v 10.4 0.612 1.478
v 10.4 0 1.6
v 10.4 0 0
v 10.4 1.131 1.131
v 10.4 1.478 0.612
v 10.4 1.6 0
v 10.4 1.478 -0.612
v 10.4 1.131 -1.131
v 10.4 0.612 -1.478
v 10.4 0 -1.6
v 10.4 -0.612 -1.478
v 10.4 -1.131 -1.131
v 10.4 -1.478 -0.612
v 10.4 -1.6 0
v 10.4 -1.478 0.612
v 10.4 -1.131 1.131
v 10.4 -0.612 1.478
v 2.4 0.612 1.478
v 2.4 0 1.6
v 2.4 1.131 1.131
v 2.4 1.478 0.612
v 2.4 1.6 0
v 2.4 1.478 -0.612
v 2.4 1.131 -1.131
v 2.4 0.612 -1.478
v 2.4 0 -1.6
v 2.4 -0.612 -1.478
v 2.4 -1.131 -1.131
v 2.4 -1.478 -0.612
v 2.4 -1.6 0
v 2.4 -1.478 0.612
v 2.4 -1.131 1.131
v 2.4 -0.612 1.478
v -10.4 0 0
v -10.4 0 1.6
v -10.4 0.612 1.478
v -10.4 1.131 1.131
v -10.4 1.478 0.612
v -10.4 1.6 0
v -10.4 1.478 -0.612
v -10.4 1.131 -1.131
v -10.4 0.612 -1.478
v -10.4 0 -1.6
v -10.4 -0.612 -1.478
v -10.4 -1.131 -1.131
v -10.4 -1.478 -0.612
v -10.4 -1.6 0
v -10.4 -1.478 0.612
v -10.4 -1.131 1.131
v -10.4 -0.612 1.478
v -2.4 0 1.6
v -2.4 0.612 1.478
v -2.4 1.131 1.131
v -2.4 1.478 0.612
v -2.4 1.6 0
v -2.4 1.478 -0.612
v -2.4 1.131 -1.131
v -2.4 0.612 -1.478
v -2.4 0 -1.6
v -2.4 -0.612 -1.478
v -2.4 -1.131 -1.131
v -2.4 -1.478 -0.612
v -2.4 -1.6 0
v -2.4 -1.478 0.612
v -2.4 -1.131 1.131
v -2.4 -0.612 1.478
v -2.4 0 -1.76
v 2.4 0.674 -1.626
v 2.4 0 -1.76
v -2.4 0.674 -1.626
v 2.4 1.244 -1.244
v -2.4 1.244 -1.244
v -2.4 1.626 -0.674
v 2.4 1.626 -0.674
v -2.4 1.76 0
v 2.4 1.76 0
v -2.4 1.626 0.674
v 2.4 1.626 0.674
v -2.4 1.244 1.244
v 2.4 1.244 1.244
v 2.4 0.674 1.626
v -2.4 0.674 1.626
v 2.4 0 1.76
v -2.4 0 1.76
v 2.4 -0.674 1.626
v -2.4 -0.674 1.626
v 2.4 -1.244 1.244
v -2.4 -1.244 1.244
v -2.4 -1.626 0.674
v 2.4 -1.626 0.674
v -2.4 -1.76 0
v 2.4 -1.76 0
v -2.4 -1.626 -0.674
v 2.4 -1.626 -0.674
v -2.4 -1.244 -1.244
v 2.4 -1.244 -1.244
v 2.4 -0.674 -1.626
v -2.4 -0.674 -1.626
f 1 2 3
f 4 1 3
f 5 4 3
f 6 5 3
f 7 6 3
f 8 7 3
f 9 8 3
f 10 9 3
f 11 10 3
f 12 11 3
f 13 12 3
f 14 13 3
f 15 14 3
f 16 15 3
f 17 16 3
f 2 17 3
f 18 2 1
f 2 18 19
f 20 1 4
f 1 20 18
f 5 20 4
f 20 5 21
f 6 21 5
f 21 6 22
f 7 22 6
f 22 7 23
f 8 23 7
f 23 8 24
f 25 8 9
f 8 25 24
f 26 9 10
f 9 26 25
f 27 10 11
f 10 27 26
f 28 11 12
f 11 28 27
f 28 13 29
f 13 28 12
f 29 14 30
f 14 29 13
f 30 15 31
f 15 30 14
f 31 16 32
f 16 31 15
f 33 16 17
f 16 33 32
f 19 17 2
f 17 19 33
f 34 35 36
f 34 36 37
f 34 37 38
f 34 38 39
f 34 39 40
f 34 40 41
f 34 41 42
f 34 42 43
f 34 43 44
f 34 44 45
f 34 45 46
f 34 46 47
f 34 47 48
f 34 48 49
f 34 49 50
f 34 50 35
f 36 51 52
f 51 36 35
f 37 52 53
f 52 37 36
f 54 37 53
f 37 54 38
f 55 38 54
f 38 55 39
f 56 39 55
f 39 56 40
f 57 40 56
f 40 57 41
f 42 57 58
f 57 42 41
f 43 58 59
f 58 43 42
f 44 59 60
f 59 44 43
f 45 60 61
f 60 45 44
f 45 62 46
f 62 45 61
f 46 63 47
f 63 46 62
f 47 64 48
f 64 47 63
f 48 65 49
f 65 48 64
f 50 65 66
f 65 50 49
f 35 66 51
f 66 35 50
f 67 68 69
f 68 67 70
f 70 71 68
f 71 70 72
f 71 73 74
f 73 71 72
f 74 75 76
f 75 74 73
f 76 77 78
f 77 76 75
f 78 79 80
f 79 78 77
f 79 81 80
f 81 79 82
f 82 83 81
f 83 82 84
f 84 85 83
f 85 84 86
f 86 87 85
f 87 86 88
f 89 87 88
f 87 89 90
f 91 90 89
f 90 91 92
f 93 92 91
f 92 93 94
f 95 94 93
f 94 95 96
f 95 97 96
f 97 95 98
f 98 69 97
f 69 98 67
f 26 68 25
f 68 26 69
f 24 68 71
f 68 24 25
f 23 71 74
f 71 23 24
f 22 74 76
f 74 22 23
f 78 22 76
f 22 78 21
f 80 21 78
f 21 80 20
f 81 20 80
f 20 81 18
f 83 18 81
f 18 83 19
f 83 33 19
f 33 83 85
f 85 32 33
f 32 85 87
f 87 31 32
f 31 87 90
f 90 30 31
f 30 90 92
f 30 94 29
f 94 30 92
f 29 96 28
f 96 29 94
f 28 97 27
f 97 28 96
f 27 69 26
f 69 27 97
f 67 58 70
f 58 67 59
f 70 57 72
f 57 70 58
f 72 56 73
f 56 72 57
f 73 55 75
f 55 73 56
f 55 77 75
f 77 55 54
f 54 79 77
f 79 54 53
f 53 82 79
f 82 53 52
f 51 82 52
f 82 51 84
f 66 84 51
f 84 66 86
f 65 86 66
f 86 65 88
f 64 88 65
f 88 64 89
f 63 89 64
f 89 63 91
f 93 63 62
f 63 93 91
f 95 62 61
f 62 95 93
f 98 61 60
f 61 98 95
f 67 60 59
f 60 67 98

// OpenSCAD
// file: ../p/4-4edge.scad
use <../lib.scad>
function ldraw_lib__4_4edge() = [
// 0 Circle 1.0
// 0 Name: 4-4edge.dat
// 0 Author: James Jessiman
// 0 !LDRAW_ORG Primitive UPDATE 2017-01
// 0 !LICENSE Licensed under CC BY 2.0 and CC BY 4.0 : see CAreadme.txt
// 
// 0 BFC CERTIFY CCW
  [0,"BFC","CERTIFY"],
  [0,"BFC","CCW"],
// 
// 0 !HISTORY 1998-12-15 [PTadmin] Official Update 1998-10
// 0 !HISTORY 2005-12-28 [PTadmin] Official Update 2005-01
// 0 !HISTORY 2007-06-24 [PTadmin] Header formatted for Contributor Agreement
// 0 !HISTORY 2008-07-01 [PTadmin] Official Update 2008-01
// 0 !HISTORY 2017-01-15 [Steffen] BFCed
// 0 !HISTORY 2017-12-30 [PTadmin] Official Update 2017-01
// 
// 
// 2 24 1 0 0 0.9239 0 0.3827
  [2,24,1,0,0,0.9239,0,0.3827],
// 2 24 0.9239 0 0.3827 0.7071 0 0.7071
  [2,24,0.9239,0,0.3827,0.7071,0,0.7071],
// 2 24 0.7071 0 0.7071 0.3827 0 0.9239
  [2,24,0.7071,0,0.7071,0.3827,0,0.9239],
// 2 24 0.3827 0 0.9239 0 0 1
  [2,24,0.3827,0,0.9239,0,0,1],
// 2 24 0 0 1 -0.3827 0 0.9239
  [2,24,0,0,1,-0.3827,0,0.9239],
// 2 24 -0.3827 0 0.9239 -0.7071 0 0.7071
  [2,24,-0.3827,0,0.9239,-0.7071,0,0.7071],
// 2 24 -0.7071 0 0.7071 -0.9239 0 0.3827
  [2,24,-0.7071,0,0.7071,-0.9239,0,0.3827],
// 2 24 -0.9239 0 0.3827 -1 0 -0
  [2,24,-0.9239,0,0.3827,-1,0,-0],
// 2 24 -1 0 -0 -0.9239 0 -0.3827
  [2,24,-1,0,-0,-0.9239,0,-0.3827],
// 2 24 -0.9239 0 -0.3827 -0.7071 0 -0.7071
  [2,24,-0.9239,0,-0.3827,-0.7071,0,-0.7071],
// 2 24 -0.7071 0 -0.7071 -0.3827 0 -0.9239
  [2,24,-0.7071,0,-0.7071,-0.3827,0,-0.9239],
// 2 24 -0.3827 0 -0.9239 0 0 -1
  [2,24,-0.3827,0,-0.9239,0,0,-1],
// 2 24 0 0 -1 0.3827 0 -0.9239
  [2,24,0,0,-1,0.3827,0,-0.9239],
// 2 24 0.3827 0 -0.9239 0.7071 0 -0.7071
  [2,24,0.3827,0,-0.9239,0.7071,0,-0.7071],
// 2 24 0.7071 0 -0.7071 0.9239 0 -0.3827
  [2,24,0.7071,0,-0.7071,0.9239,0,-0.3827],
// 2 24 0.9239 0 -0.3827 1 0 0
  [2,24,0.9239,0,-0.3827,1,0,0],
];
makepoly(ldraw_lib__4_4edge(), line=0.2);
// file: ../p/4-4disc.scad
use <../lib.scad>
function ldraw_lib__4_4disc() = [
// 0 Disc 1.0
// 0 Name: 4-4disc.dat
// 0 Author: James Jessiman
// 0 !LDRAW_ORG Primitive UPDATE 2002-02
// 0 !LICENSE Licensed under CC BY 2.0 and CC BY 4.0 : see CAreadme.txt
// 
// 0 BFC CERTIFY CCW
  [0,"BFC","CERTIFY"],
  [0,"BFC","CCW"],
// 
// 0 !HISTORY 1998-12-15 [PTadmin] Official Update 1998-10
// 0 !HISTORY 2002-03-23 [sbliss] Added BFC statement
// 0 !HISTORY 2002-04-25 [PTadmin] Official Update 2002-02
// 0 !HISTORY 2007-06-24 [PTadmin] Header formatted for Contributor Agreement
// 0 !HISTORY 2008-07-01 [PTadmin] Official Update 2008-01
// 
// 
// 3 16 0 0 0 1 0 0 0.9239 0 0.3827
  [3,16,0,0,0,1,0,0,0.9239,0,0.3827],
// 3 16 0 0 0 0.9239 0 0.3827 0.7071 0 0.7071
  [3,16,0,0,0,0.9239,0,0.3827,0.7071,0,0.7071],
// 3 16 0 0 0 0.7071 0 0.7071 0.3827 0 0.9239
  [3,16,0,0,0,0.7071,0,0.7071,0.3827,0,0.9239],
// 3 16 0 0 0 0.3827 0 0.9239 0 0 1
  [3,16,0,0,0,0.3827,0,0.9239,0,0,1],
// 3 16 0 0 0 0 0 1 -0.3827 0 0.9239
  [3,16,0,0,0,0,0,1,-0.3827,0,0.9239],
// 3 16 0 0 0 -0.3827 0 0.9239 -0.7071 0 0.7071
  [3,16,0,0,0,-0.3827,0,0.9239,-0.7071,0,0.7071],
// 3 16 0 0 0 -0.7071 0 0.7071 -0.9239 0 0.3827
  [3,16,0,0,0,-0.7071,0,0.7071,-0.9239,0,0.3827],
// 3 16 0 0 0 -0.9239 0 0.3827 -1 0 -0
  [3,16,0,0,0,-0.9239,0,0.3827,-1,0,-0],
// 3 16 0 0 0 -1 0 -0 -0.9239 0 -0.3827
  [3,16,0,0,0,-1,0,-0,-0.9239,0,-0.3827],
// 3 16 0 0 0 -0.9239 0 -0.3827 -0.7071 0 -0.7071
  [3,16,0,0,0,-0.9239,0,-0.3827,-0.7071,0,-0.7071],
// 3 16 0 0 0 -0.7071 0 -0.7071 -0.3827 0 -0.9239
  [3,16,0,0,0,-0.7071,0,-0.7071,-0.3827,0,-0.9239],
// 3 16 0 0 0 -0.3827 0 -0.9239 0 0 -1
  [3,16,0,0,0,-0.3827,0,-0.9239,0,0,-1],
// 3 16 0 0 0 0 0 -1 0.3827 0 -0.9239
  [3,16,0,0,0,0,0,-1,0.3827,0,-0.9239],
// 3 16 0 0 0 0.3827 0 -0.9239 0.7071 0 -0.7071
  [3,16,0,0,0,0.3827,0,-0.9239,0.7071,0,-0.7071],
// 3 16 0 0 0 0.7071 0 -0.7071 0.9239 0 -0.3827
  [3,16,0,0,0,0.7071,0,-0.7071,0.9239,0,-0.3827],
// 3 16 0 0 0 0.9239 0 -0.3827 1 0 0
  [3,16,0,0,0,0.9239,0,-0.3827,1,0,0],
// 0
];
makepoly(ldraw_lib__4_4disc(), line=0.2);
// file: ../p/4-4cyli.scad
use <../lib.scad>
function ldraw_lib__4_4cyli() = [
// 0 Cylinder 1.0
// 0 Name: 4-4cyli.dat
// 0 Author: James Jessiman
// 0 !LDRAW_ORG Primitive UPDATE 2005-01
// 0 !LICENSE Licensed under CC BY 2.0 and CC BY 4.0 : see CAreadme.txt
// 
// 0 BFC CERTIFY CCW
  [0,"BFC","CERTIFY"],
  [0,"BFC","CCW"],
// 
// 0 !HISTORY 1998-12-15 [PTadmin] Official Update 1998-10
// 0 !HISTORY 2002-03-23 [sbliss] Added BFC statement; merged headers from files in distributions LDraw 0.27 and Complete.
// 0 !HISTORY 2002-04-25 [PTadmin] Official Update 2002-02
// 0 !HISTORY 2004-12-14 [guyvivan] BFC CCW
// 0 !HISTORY 2005-12-28 [PTadmin] Official Update 2005-01
// 0 !HISTORY 2007-06-24 [PTadmin] Header formatted for Contributor Agreement
// 0 !HISTORY 2008-07-01 [PTadmin] Official Update 2008-01
// 
// 
// 4 16 1 1 0 0.9239 1 0.3827 0.9239 0 0.3827 1 0 0
  [4,16,1,1,0,0.9239,1,0.3827,0.9239,0,0.3827,1,0,0],
// 5 24 1 0 0 1 1 0 0.9239 0 0.3827 0.9239 0 -0.3827
  [5,24,1,0,0,1,1,0,0.9239,0,0.3827,0.9239,0,-0.3827],
// 4 16 0.9239 1 0.3827 0.7071 1 0.7071 0.7071 0 0.7071 0.9239 0 0.3827
  [4,16,0.9239,1,0.3827,0.7071,1,0.7071,0.7071,0,0.7071,0.9239,0,0.3827],
// 5 24 0.9239 0 0.3827 0.9239 1 0.3827 0.7071 0 0.7071 1 0 0
  [5,24,0.9239,0,0.3827,0.9239,1,0.3827,0.7071,0,0.7071,1,0,0],
// 4 16 0.7071 1 0.7071 0.3827 1 0.9239 0.3827 0 0.9239 0.7071 0 0.7071
  [4,16,0.7071,1,0.7071,0.3827,1,0.9239,0.3827,0,0.9239,0.7071,0,0.7071],
// 5 24 0.7071 0 0.7071 0.7071 1 0.7071 0.3827 0 0.9239 0.9239 0 0.3827
  [5,24,0.7071,0,0.7071,0.7071,1,0.7071,0.3827,0,0.9239,0.9239,0,0.3827],
// 4 16 0.3827 1 0.9239 0 1 1 0 0 1 0.3827 0 0.9239
  [4,16,0.3827,1,0.9239,0,1,1,0,0,1,0.3827,0,0.9239],
// 5 24 0.3827 0 0.9239 0.3827 1 0.9239 0 0 1 0.7071 0 0.7071
  [5,24,0.3827,0,0.9239,0.3827,1,0.9239,0,0,1,0.7071,0,0.7071],
// 4 16 0 1 1 -0.3827 1 0.9239 -0.3827 0 0.9239 0 0 1
  [4,16,0,1,1,-0.3827,1,0.9239,-0.3827,0,0.9239,0,0,1],
// 5 24 0 0 1 0 1 1 -0.3827 0 0.9239 0.3827 0 0.9239
  [5,24,0,0,1,0,1,1,-0.3827,0,0.9239,0.3827,0,0.9239],
// 4 16 -0.3827 1 0.9239 -0.7071 1 0.7071 -0.7071 0 0.7071 -0.3827 0 0.9239
  [4,16,-0.3827,1,0.9239,-0.7071,1,0.7071,-0.7071,0,0.7071,-0.3827,0,0.9239],
// 5 24 -0.3827 0 0.9239 -0.3827 1 0.9239 -0.7071 0 0.7071 0 0 1
  [5,24,-0.3827,0,0.9239,-0.3827,1,0.9239,-0.7071,0,0.7071,0,0,1],
// 4 16 -0.7071 1 0.7071 -0.9239 1 0.3827 -0.9239 0 0.3827 -0.7071 0 0.7071
  [4,16,-0.7071,1,0.7071,-0.9239,1,0.3827,-0.9239,0,0.3827,-0.7071,0,0.7071],
// 5 24 -0.7071 0 0.7071 -0.7071 1 0.7071 -0.9239 0 0.3827 -0.3827 0 0.9239
  [5,24,-0.7071,0,0.7071,-0.7071,1,0.7071,-0.9239,0,0.3827,-0.3827,0,0.9239],
// 4 16 -0.9239 1 0.3827 -1 1 0 -1 0 0 -0.9239 0 0.3827
  [4,16,-0.9239,1,0.3827,-1,1,0,-1,0,0,-0.9239,0,0.3827],
// 5 24 -0.9239 0 0.3827 -0.9239 1 0.3827 -1 0 0 -0.7071 0 0.7071
  [5,24,-0.9239,0,0.3827,-0.9239,1,0.3827,-1,0,0,-0.7071,0,0.7071],
// 4 16 -1 1 0 -0.9239 1 -0.3827 -0.9239 0 -0.3827 -1 0 0
  [4,16,-1,1,0,-0.9239,1,-0.3827,-0.9239,0,-0.3827,-1,0,0],
// 5 24 -1 0 0 -1 1 0 -0.9239 0 -0.3827 -0.9239 0 0.3827
  [5,24,-1,0,0,-1,1,0,-0.9239,0,-0.3827,-0.9239,0,0.3827],
// 4 16 -0.9239 1 -0.3827 -0.7071 1 -0.7071 -0.7071 0 -0.7071 -0.9239 0 -0.3827
  [4,16,-0.9239,1,-0.3827,-0.7071,1,-0.7071,-0.7071,0,-0.7071,-0.9239,0,-0.3827],
// 5 24 -0.9239 0 -0.3827 -0.9239 1 -0.3827 -0.7071 0 -0.7071 -1 0 0
  [5,24,-0.9239,0,-0.3827,-0.9239,1,-0.3827,-0.7071,0,-0.7071,-1,0,0],
// 4 16 -0.7071 1 -0.7071 -0.3827 1 -0.9239 -0.3827 0 -0.9239 -0.7071 0 -0.7071
  [4,16,-0.7071,1,-0.7071,-0.3827,1,-0.9239,-0.3827,0,-0.9239,-0.7071,0,-0.7071],
// 5 24 -0.7071 0 -0.7071 -0.7071 1 -0.7071 -0.3827 0 -0.9239 -0.9239 0 -0.3827
  [5,24,-0.7071,0,-0.7071,-0.7071,1,-0.7071,-0.3827,0,-0.9239,-0.9239,0,-0.3827],
// 4 16 -0.3827 1 -0.9239 0 1 -1 0 0 -1 -0.3827 0 -0.9239
  [4,16,-0.3827,1,-0.9239,0,1,-1,0,0,-1,-0.3827,0,-0.9239],
// 5 24 -0.3827 0 -0.9239 -0.3827 1 -0.9239 0 0 -1 -0.7071 0 -0.7071
  [5,24,-0.3827,0,-0.9239,-0.3827,1,-0.9239,0,0,-1,-0.7071,0,-0.7071],
// 4 16 0 1 -1 0.3827 1 -0.9239 0.3827 0 -0.9239 0 0 -1
  [4,16,0,1,-1,0.3827,1,-0.9239,0.3827,0,-0.9239,0,0,-1],
// 5 24 0 0 -1 0 1 -1 0.3827 0 -0.9239 -0.3827 0 -0.9239
  [5,24,0,0,-1,0,1,-1,0.3827,0,-0.9239,-0.3827,0,-0.9239],
// 4 16 0.3827 1 -0.9239 0.7071 1 -0.7071 0.7071 0 -0.7071 0.3827 0 -0.9239
  [4,16,0.3827,1,-0.9239,0.7071,1,-0.7071,0.7071,0,-0.7071,0.3827,0,-0.9239],
// 5 24 0.3827 0 -0.9239 0.3827 1 -0.9239 0.7071 0 -0.7071 0 0 -1
  [5,24,0.3827,0,-0.9239,0.3827,1,-0.9239,0.7071,0,-0.7071,0,0,-1],
// 4 16 0.7071 1 -0.7071 0.9239 1 -0.3827 0.9239 0 -0.3827 0.7071 0 -0.7071
  [4,16,0.7071,1,-0.7071,0.9239,1,-0.3827,0.9239,0,-0.3827,0.7071,0,-0.7071],
// 5 24 0.7071 0 -0.7071 0.7071 1 -0.7071 0.9239 0 -0.3827 0.3827 0 -0.9239
  [5,24,0.7071,0,-0.7071,0.7071,1,-0.7071,0.9239,0,-0.3827,0.3827,0,-0.9239],
// 4 16 0.9239 1 -0.3827 1 1 0 1 0 0 0.9239 0 -0.3827
  [4,16,0.9239,1,-0.3827,1,1,0,1,0,0,0.9239,0,-0.3827],
// 5 24 0.9239 0 -0.3827 0.9239 1 -0.3827 1 0 0 0.7071 0 -0.7071
  [5,24,0.9239,0,-0.3827,0.9239,1,-0.3827,1,0,0,0.7071,0,-0.7071],
// 0
];
makepoly(ldraw_lib__4_4cyli(), line=0.2);
// file: ../p/4-4rin10.scad
use <../lib.scad>
function ldraw_lib__4_4rin10() = [
// 0 Ring 10 x 1.0
// 0 Name: 4-4rin10.dat
// 0 Author: Paul Easter [pneaster]
// 0 !LDRAW_ORG Primitive UPDATE 2010-03
// 0 !LICENSE Licensed under CC BY 2.0 and CC BY 4.0 : see CAreadme.txt
// 
// 0 BFC CERTIFY CCW
  [0,"BFC","CERTIFY"],
  [0,"BFC","CCW"],
// 
// 0 !HISTORY 2004-04-22 [PTadmin] Official Update 2004-02
// 0 !HISTORY 2007-06-24 [PTadmin] Header formatted for Contributor Agreement
// 0 !HISTORY 2008-07-01 [PTadmin] Official Update 2008-01
// 0 !HISTORY 2010-12-19 [MagFors] Corrected with Primitive Generator 2
// 0 !HISTORY 2010-12-31 [PTadmin] Official Update 2010-03
// 
// 
// 4 16 11 0 0 10.1629 0 4.2097 9.239 0 3.827 10 0 0
  [4,16,11,0,0,10.1629,0,4.2097,9.239,0,3.827,10,0,0],
// 4 16 10.1629 0 4.2097 7.7781 0 7.7781 7.071 0 7.071 9.239 0 3.827
  [4,16,10.1629,0,4.2097,7.7781,0,7.7781,7.071,0,7.071,9.239,0,3.827],
// 4 16 7.7781 0 7.7781 4.2097 0 10.1629 3.827 0 9.239 7.071 0 7.071
  [4,16,7.7781,0,7.7781,4.2097,0,10.1629,3.827,0,9.239,7.071,0,7.071],
// 4 16 4.2097 0 10.1629 0 0 11 0 0 10 3.827 0 9.239
  [4,16,4.2097,0,10.1629,0,0,11,0,0,10,3.827,0,9.239],
// 4 16 0 0 11 -4.2097 0 10.1629 -3.827 0 9.239 0 0 10
  [4,16,0,0,11,-4.2097,0,10.1629,-3.827,0,9.239,0,0,10],
// 4 16 -4.2097 0 10.1629 -7.7781 0 7.7781 -7.071 0 7.071 -3.827 0 9.239
  [4,16,-4.2097,0,10.1629,-7.7781,0,7.7781,-7.071,0,7.071,-3.827,0,9.239],
// 4 16 -7.7781 0 7.7781 -10.1629 0 4.2097 -9.239 0 3.827 -7.071 0 7.071
  [4,16,-7.7781,0,7.7781,-10.1629,0,4.2097,-9.239,0,3.827,-7.071,0,7.071],
// 4 16 -10.1629 0 4.2097 -11 0 0 -10 0 0 -9.239 0 3.827
  [4,16,-10.1629,0,4.2097,-11,0,0,-10,0,0,-9.239,0,3.827],
// 4 16 -11 0 0 -10.1629 0 -4.2097 -9.239 0 -3.827 -10 0 0
  [4,16,-11,0,0,-10.1629,0,-4.2097,-9.239,0,-3.827,-10,0,0],
// 4 16 -10.1629 0 -4.2097 -7.7781 0 -7.7781 -7.071 0 -7.071 -9.239 0 -3.827
  [4,16,-10.1629,0,-4.2097,-7.7781,0,-7.7781,-7.071,0,-7.071,-9.239,0,-3.827],
// 4 16 -7.7781 0 -7.7781 -4.2097 0 -10.1629 -3.827 0 -9.239 -7.071 0 -7.071
  [4,16,-7.7781,0,-7.7781,-4.2097,0,-10.1629,-3.827,0,-9.239,-7.071,0,-7.071],
// 4 16 -4.2097 0 -10.1629 0 0 -11 0 0 -10 -3.827 0 -9.239
  [4,16,-4.2097,0,-10.1629,0,0,-11,0,0,-10,-3.827,0,-9.239],
// 4 16 0 0 -11 4.2097 0 -10.1629 3.827 0 -9.239 0 0 -10
  [4,16,0,0,-11,4.2097,0,-10.1629,3.827,0,-9.239,0,0,-10],
// 4 16 4.2097 0 -10.1629 7.7781 0 -7.7781 7.071 0 -7.071 3.827 0 -9.239
  [4,16,4.2097,0,-10.1629,7.7781,0,-7.7781,7.071,0,-7.071,3.827,0,-9.239],
// 4 16 7.7781 0 -7.7781 10.1629 0 -4.2097 9.239 0 -3.827 7.071 0 -7.071
  [4,16,7.7781,0,-7.7781,10.1629,0,-4.2097,9.239,0,-3.827,7.071,0,-7.071],
// 4 16 10.1629 0 -4.2097 11 0 0 10 0 0 9.239 0 -3.827
  [4,16,10.1629,0,-4.2097,11,0,0,10,0,0,9.239,0,-3.827],
// 0 // Build by Primitive Generator 2
// 
];
makepoly(ldraw_lib__4_4rin10(), line=0.2);
// file: ../p/4-4cylo.scad
use <../lib.scad>
use <4-4cyli.scad>
use <4-4edge.scad>
function ldraw_lib__4_4cylo() = [
// 0 Cylinder Open 1.0
// 0 Name: 4-4cylo.dat
// 0 Author: Mark Kennedy [mkennedy]
// 0 !LDRAW_ORG Primitive UPDATE 2010-01
// 0 !LICENSE Licensed under CC BY 2.0 and CC BY 4.0 : see CAreadme.txt
// 
// 0 BFC CERTIFY CCW
  [0,"BFC","CERTIFY"],
  [0,"BFC","CCW"],
// 
// 0 !HISTORY 2010-04-05 [PTadmin] Official Update 2010-01
// 
// 
// 1 16 0 0 0 1 0 0 0 1 0 0 0 1 4-4edge.dat
  [1,16,0,0,0,1,0,0,0,1,0,0,0,1, ldraw_lib__4_4edge()],
// 1 16 0 1 0 1 0 0 0 1 0 0 0 1 4-4edge.dat
  [1,16,0,1,0,1,0,0,0,1,0,0,0,1, ldraw_lib__4_4edge()],
// 1 16 0 0 0 1 0 0 0 1 0 0 0 1 4-4cyli.dat
  [1,16,0,0,0,1,0,0,0,1,0,0,0,1, ldraw_lib__4_4cyli()],
// 0
];
makepoly(ldraw_lib__4_4cylo(), line=0.2);
// file: ../p/4-4cylc.scad
use <../lib.scad>
use <4-4cyli.scad>
use <4-4disc.scad>
use <4-4edge.scad>
function ldraw_lib__4_4cylc() = [
// 0 Cylinder Closed 1.0
// 0 Name: 4-4cylc.dat
// 0 Author: Alex Taylor [anathema]
// 0 !LDRAW_ORG Primitive UPDATE 2009-02
// 0 !LICENSE Licensed under CC BY 2.0 and CC BY 4.0 : see CAreadme.txt
// 
// 0 BFC CERTIFY CCW
  [0,"BFC","CERTIFY"],
  [0,"BFC","CCW"],
// 
// 0 !HISTORY 2008-12-29 [cwdee] Removed one disc
// 0 !HISTORY 2009-09-03 [PTadmin] Official Update 2009-02
// 
// 
// 1 16 0 0 0 1 0 0 0 1 0 0 0 1 4-4edge.dat
  [1,16,0,0,0,1,0,0,0,1,0,0,0,1, ldraw_lib__4_4edge()],
// 1 16 0 1 0 1 0 0 0 1 0 0 0 1 4-4edge.dat
  [1,16,0,1,0,1,0,0,0,1,0,0,0,1, ldraw_lib__4_4edge()],
// 1 16 0 0 0 1 0 0 0 1 0 0 0 1 4-4disc.dat
  [1,16,0,0,0,1,0,0,0,1,0,0,0,1, ldraw_lib__4_4disc()],
// 1 16 0 0 0 1 0 0 0 1 0 0 0 1 4-4cyli.dat
  [1,16,0,0,0,1,0,0,0,1,0,0,0,1, ldraw_lib__4_4cyli()],
// 0
];
makepoly(ldraw_lib__4_4cylc(), line=0.2);
// main file
use <../lib.scad>
use <../p/4-4cylc.scad>
use <../p/4-4cylo.scad>
use <../p/4-4rin10.scad>
function ldraw_lib__47207() = [
// 0 Figure Duplo Hips Hinge Bar
// 0 Name: 47207.dat
// 0 Author: Philippe Hurbain [Philo]
// 0 !LDRAW_ORG Part UPDATE 2018-02
// 0 !LICENSE Licensed under CC BY 2.0 and CC BY 4.0 : see CAreadme.txt
// 
// 0 BFC CERTIFY CCW
  [0,"BFC","CERTIFY"],
  [0,"BFC","CCW"],
// 
// 0 !HISTORY 2018-12-08 [PTadmin] Official Update 2018-02
// 
// 
// 1 16 26 0 0 0 -20 0 -4 0 0 0 0 4 4-4cylc.dat
  [1,16,26,0,0,0,-20,0,-4,0,0,0,0,4, ldraw_lib__4_4cylc()],
// 1 16 -26 0 0 0 20 0 -4 0 0 0 0 4 4-4cylc.dat
  [1,16,-26,0,0,0,20,0,-4,0,0,0,0,4, ldraw_lib__4_4cylc()],
// 1 16 6 0 0 0 -12 0 4.4 0 0 0 0 4.4 4-4cylo.dat
  [1,16,6,0,0,0,-12,0,4.4,0,0,0,0,4.4, ldraw_lib__4_4cylo()],
// 1 16 6 0 0 0 -1 0 0.4 0 0 0 0 0.4 4-4rin10.dat
  [1,16,6,0,0,0,-1,0,0.4,0,0,0,0,0.4, ldraw_lib__4_4rin10()],
// 1 16 -6 0 0 0 1 0 0.4 0 0 0 0 0.4 4-4rin10.dat
  [1,16,-6,0,0,0,1,0,0.4,0,0,0,0,0.4, ldraw_lib__4_4rin10()],
];
makepoly(ldraw_lib__47207(), line=0.2);
